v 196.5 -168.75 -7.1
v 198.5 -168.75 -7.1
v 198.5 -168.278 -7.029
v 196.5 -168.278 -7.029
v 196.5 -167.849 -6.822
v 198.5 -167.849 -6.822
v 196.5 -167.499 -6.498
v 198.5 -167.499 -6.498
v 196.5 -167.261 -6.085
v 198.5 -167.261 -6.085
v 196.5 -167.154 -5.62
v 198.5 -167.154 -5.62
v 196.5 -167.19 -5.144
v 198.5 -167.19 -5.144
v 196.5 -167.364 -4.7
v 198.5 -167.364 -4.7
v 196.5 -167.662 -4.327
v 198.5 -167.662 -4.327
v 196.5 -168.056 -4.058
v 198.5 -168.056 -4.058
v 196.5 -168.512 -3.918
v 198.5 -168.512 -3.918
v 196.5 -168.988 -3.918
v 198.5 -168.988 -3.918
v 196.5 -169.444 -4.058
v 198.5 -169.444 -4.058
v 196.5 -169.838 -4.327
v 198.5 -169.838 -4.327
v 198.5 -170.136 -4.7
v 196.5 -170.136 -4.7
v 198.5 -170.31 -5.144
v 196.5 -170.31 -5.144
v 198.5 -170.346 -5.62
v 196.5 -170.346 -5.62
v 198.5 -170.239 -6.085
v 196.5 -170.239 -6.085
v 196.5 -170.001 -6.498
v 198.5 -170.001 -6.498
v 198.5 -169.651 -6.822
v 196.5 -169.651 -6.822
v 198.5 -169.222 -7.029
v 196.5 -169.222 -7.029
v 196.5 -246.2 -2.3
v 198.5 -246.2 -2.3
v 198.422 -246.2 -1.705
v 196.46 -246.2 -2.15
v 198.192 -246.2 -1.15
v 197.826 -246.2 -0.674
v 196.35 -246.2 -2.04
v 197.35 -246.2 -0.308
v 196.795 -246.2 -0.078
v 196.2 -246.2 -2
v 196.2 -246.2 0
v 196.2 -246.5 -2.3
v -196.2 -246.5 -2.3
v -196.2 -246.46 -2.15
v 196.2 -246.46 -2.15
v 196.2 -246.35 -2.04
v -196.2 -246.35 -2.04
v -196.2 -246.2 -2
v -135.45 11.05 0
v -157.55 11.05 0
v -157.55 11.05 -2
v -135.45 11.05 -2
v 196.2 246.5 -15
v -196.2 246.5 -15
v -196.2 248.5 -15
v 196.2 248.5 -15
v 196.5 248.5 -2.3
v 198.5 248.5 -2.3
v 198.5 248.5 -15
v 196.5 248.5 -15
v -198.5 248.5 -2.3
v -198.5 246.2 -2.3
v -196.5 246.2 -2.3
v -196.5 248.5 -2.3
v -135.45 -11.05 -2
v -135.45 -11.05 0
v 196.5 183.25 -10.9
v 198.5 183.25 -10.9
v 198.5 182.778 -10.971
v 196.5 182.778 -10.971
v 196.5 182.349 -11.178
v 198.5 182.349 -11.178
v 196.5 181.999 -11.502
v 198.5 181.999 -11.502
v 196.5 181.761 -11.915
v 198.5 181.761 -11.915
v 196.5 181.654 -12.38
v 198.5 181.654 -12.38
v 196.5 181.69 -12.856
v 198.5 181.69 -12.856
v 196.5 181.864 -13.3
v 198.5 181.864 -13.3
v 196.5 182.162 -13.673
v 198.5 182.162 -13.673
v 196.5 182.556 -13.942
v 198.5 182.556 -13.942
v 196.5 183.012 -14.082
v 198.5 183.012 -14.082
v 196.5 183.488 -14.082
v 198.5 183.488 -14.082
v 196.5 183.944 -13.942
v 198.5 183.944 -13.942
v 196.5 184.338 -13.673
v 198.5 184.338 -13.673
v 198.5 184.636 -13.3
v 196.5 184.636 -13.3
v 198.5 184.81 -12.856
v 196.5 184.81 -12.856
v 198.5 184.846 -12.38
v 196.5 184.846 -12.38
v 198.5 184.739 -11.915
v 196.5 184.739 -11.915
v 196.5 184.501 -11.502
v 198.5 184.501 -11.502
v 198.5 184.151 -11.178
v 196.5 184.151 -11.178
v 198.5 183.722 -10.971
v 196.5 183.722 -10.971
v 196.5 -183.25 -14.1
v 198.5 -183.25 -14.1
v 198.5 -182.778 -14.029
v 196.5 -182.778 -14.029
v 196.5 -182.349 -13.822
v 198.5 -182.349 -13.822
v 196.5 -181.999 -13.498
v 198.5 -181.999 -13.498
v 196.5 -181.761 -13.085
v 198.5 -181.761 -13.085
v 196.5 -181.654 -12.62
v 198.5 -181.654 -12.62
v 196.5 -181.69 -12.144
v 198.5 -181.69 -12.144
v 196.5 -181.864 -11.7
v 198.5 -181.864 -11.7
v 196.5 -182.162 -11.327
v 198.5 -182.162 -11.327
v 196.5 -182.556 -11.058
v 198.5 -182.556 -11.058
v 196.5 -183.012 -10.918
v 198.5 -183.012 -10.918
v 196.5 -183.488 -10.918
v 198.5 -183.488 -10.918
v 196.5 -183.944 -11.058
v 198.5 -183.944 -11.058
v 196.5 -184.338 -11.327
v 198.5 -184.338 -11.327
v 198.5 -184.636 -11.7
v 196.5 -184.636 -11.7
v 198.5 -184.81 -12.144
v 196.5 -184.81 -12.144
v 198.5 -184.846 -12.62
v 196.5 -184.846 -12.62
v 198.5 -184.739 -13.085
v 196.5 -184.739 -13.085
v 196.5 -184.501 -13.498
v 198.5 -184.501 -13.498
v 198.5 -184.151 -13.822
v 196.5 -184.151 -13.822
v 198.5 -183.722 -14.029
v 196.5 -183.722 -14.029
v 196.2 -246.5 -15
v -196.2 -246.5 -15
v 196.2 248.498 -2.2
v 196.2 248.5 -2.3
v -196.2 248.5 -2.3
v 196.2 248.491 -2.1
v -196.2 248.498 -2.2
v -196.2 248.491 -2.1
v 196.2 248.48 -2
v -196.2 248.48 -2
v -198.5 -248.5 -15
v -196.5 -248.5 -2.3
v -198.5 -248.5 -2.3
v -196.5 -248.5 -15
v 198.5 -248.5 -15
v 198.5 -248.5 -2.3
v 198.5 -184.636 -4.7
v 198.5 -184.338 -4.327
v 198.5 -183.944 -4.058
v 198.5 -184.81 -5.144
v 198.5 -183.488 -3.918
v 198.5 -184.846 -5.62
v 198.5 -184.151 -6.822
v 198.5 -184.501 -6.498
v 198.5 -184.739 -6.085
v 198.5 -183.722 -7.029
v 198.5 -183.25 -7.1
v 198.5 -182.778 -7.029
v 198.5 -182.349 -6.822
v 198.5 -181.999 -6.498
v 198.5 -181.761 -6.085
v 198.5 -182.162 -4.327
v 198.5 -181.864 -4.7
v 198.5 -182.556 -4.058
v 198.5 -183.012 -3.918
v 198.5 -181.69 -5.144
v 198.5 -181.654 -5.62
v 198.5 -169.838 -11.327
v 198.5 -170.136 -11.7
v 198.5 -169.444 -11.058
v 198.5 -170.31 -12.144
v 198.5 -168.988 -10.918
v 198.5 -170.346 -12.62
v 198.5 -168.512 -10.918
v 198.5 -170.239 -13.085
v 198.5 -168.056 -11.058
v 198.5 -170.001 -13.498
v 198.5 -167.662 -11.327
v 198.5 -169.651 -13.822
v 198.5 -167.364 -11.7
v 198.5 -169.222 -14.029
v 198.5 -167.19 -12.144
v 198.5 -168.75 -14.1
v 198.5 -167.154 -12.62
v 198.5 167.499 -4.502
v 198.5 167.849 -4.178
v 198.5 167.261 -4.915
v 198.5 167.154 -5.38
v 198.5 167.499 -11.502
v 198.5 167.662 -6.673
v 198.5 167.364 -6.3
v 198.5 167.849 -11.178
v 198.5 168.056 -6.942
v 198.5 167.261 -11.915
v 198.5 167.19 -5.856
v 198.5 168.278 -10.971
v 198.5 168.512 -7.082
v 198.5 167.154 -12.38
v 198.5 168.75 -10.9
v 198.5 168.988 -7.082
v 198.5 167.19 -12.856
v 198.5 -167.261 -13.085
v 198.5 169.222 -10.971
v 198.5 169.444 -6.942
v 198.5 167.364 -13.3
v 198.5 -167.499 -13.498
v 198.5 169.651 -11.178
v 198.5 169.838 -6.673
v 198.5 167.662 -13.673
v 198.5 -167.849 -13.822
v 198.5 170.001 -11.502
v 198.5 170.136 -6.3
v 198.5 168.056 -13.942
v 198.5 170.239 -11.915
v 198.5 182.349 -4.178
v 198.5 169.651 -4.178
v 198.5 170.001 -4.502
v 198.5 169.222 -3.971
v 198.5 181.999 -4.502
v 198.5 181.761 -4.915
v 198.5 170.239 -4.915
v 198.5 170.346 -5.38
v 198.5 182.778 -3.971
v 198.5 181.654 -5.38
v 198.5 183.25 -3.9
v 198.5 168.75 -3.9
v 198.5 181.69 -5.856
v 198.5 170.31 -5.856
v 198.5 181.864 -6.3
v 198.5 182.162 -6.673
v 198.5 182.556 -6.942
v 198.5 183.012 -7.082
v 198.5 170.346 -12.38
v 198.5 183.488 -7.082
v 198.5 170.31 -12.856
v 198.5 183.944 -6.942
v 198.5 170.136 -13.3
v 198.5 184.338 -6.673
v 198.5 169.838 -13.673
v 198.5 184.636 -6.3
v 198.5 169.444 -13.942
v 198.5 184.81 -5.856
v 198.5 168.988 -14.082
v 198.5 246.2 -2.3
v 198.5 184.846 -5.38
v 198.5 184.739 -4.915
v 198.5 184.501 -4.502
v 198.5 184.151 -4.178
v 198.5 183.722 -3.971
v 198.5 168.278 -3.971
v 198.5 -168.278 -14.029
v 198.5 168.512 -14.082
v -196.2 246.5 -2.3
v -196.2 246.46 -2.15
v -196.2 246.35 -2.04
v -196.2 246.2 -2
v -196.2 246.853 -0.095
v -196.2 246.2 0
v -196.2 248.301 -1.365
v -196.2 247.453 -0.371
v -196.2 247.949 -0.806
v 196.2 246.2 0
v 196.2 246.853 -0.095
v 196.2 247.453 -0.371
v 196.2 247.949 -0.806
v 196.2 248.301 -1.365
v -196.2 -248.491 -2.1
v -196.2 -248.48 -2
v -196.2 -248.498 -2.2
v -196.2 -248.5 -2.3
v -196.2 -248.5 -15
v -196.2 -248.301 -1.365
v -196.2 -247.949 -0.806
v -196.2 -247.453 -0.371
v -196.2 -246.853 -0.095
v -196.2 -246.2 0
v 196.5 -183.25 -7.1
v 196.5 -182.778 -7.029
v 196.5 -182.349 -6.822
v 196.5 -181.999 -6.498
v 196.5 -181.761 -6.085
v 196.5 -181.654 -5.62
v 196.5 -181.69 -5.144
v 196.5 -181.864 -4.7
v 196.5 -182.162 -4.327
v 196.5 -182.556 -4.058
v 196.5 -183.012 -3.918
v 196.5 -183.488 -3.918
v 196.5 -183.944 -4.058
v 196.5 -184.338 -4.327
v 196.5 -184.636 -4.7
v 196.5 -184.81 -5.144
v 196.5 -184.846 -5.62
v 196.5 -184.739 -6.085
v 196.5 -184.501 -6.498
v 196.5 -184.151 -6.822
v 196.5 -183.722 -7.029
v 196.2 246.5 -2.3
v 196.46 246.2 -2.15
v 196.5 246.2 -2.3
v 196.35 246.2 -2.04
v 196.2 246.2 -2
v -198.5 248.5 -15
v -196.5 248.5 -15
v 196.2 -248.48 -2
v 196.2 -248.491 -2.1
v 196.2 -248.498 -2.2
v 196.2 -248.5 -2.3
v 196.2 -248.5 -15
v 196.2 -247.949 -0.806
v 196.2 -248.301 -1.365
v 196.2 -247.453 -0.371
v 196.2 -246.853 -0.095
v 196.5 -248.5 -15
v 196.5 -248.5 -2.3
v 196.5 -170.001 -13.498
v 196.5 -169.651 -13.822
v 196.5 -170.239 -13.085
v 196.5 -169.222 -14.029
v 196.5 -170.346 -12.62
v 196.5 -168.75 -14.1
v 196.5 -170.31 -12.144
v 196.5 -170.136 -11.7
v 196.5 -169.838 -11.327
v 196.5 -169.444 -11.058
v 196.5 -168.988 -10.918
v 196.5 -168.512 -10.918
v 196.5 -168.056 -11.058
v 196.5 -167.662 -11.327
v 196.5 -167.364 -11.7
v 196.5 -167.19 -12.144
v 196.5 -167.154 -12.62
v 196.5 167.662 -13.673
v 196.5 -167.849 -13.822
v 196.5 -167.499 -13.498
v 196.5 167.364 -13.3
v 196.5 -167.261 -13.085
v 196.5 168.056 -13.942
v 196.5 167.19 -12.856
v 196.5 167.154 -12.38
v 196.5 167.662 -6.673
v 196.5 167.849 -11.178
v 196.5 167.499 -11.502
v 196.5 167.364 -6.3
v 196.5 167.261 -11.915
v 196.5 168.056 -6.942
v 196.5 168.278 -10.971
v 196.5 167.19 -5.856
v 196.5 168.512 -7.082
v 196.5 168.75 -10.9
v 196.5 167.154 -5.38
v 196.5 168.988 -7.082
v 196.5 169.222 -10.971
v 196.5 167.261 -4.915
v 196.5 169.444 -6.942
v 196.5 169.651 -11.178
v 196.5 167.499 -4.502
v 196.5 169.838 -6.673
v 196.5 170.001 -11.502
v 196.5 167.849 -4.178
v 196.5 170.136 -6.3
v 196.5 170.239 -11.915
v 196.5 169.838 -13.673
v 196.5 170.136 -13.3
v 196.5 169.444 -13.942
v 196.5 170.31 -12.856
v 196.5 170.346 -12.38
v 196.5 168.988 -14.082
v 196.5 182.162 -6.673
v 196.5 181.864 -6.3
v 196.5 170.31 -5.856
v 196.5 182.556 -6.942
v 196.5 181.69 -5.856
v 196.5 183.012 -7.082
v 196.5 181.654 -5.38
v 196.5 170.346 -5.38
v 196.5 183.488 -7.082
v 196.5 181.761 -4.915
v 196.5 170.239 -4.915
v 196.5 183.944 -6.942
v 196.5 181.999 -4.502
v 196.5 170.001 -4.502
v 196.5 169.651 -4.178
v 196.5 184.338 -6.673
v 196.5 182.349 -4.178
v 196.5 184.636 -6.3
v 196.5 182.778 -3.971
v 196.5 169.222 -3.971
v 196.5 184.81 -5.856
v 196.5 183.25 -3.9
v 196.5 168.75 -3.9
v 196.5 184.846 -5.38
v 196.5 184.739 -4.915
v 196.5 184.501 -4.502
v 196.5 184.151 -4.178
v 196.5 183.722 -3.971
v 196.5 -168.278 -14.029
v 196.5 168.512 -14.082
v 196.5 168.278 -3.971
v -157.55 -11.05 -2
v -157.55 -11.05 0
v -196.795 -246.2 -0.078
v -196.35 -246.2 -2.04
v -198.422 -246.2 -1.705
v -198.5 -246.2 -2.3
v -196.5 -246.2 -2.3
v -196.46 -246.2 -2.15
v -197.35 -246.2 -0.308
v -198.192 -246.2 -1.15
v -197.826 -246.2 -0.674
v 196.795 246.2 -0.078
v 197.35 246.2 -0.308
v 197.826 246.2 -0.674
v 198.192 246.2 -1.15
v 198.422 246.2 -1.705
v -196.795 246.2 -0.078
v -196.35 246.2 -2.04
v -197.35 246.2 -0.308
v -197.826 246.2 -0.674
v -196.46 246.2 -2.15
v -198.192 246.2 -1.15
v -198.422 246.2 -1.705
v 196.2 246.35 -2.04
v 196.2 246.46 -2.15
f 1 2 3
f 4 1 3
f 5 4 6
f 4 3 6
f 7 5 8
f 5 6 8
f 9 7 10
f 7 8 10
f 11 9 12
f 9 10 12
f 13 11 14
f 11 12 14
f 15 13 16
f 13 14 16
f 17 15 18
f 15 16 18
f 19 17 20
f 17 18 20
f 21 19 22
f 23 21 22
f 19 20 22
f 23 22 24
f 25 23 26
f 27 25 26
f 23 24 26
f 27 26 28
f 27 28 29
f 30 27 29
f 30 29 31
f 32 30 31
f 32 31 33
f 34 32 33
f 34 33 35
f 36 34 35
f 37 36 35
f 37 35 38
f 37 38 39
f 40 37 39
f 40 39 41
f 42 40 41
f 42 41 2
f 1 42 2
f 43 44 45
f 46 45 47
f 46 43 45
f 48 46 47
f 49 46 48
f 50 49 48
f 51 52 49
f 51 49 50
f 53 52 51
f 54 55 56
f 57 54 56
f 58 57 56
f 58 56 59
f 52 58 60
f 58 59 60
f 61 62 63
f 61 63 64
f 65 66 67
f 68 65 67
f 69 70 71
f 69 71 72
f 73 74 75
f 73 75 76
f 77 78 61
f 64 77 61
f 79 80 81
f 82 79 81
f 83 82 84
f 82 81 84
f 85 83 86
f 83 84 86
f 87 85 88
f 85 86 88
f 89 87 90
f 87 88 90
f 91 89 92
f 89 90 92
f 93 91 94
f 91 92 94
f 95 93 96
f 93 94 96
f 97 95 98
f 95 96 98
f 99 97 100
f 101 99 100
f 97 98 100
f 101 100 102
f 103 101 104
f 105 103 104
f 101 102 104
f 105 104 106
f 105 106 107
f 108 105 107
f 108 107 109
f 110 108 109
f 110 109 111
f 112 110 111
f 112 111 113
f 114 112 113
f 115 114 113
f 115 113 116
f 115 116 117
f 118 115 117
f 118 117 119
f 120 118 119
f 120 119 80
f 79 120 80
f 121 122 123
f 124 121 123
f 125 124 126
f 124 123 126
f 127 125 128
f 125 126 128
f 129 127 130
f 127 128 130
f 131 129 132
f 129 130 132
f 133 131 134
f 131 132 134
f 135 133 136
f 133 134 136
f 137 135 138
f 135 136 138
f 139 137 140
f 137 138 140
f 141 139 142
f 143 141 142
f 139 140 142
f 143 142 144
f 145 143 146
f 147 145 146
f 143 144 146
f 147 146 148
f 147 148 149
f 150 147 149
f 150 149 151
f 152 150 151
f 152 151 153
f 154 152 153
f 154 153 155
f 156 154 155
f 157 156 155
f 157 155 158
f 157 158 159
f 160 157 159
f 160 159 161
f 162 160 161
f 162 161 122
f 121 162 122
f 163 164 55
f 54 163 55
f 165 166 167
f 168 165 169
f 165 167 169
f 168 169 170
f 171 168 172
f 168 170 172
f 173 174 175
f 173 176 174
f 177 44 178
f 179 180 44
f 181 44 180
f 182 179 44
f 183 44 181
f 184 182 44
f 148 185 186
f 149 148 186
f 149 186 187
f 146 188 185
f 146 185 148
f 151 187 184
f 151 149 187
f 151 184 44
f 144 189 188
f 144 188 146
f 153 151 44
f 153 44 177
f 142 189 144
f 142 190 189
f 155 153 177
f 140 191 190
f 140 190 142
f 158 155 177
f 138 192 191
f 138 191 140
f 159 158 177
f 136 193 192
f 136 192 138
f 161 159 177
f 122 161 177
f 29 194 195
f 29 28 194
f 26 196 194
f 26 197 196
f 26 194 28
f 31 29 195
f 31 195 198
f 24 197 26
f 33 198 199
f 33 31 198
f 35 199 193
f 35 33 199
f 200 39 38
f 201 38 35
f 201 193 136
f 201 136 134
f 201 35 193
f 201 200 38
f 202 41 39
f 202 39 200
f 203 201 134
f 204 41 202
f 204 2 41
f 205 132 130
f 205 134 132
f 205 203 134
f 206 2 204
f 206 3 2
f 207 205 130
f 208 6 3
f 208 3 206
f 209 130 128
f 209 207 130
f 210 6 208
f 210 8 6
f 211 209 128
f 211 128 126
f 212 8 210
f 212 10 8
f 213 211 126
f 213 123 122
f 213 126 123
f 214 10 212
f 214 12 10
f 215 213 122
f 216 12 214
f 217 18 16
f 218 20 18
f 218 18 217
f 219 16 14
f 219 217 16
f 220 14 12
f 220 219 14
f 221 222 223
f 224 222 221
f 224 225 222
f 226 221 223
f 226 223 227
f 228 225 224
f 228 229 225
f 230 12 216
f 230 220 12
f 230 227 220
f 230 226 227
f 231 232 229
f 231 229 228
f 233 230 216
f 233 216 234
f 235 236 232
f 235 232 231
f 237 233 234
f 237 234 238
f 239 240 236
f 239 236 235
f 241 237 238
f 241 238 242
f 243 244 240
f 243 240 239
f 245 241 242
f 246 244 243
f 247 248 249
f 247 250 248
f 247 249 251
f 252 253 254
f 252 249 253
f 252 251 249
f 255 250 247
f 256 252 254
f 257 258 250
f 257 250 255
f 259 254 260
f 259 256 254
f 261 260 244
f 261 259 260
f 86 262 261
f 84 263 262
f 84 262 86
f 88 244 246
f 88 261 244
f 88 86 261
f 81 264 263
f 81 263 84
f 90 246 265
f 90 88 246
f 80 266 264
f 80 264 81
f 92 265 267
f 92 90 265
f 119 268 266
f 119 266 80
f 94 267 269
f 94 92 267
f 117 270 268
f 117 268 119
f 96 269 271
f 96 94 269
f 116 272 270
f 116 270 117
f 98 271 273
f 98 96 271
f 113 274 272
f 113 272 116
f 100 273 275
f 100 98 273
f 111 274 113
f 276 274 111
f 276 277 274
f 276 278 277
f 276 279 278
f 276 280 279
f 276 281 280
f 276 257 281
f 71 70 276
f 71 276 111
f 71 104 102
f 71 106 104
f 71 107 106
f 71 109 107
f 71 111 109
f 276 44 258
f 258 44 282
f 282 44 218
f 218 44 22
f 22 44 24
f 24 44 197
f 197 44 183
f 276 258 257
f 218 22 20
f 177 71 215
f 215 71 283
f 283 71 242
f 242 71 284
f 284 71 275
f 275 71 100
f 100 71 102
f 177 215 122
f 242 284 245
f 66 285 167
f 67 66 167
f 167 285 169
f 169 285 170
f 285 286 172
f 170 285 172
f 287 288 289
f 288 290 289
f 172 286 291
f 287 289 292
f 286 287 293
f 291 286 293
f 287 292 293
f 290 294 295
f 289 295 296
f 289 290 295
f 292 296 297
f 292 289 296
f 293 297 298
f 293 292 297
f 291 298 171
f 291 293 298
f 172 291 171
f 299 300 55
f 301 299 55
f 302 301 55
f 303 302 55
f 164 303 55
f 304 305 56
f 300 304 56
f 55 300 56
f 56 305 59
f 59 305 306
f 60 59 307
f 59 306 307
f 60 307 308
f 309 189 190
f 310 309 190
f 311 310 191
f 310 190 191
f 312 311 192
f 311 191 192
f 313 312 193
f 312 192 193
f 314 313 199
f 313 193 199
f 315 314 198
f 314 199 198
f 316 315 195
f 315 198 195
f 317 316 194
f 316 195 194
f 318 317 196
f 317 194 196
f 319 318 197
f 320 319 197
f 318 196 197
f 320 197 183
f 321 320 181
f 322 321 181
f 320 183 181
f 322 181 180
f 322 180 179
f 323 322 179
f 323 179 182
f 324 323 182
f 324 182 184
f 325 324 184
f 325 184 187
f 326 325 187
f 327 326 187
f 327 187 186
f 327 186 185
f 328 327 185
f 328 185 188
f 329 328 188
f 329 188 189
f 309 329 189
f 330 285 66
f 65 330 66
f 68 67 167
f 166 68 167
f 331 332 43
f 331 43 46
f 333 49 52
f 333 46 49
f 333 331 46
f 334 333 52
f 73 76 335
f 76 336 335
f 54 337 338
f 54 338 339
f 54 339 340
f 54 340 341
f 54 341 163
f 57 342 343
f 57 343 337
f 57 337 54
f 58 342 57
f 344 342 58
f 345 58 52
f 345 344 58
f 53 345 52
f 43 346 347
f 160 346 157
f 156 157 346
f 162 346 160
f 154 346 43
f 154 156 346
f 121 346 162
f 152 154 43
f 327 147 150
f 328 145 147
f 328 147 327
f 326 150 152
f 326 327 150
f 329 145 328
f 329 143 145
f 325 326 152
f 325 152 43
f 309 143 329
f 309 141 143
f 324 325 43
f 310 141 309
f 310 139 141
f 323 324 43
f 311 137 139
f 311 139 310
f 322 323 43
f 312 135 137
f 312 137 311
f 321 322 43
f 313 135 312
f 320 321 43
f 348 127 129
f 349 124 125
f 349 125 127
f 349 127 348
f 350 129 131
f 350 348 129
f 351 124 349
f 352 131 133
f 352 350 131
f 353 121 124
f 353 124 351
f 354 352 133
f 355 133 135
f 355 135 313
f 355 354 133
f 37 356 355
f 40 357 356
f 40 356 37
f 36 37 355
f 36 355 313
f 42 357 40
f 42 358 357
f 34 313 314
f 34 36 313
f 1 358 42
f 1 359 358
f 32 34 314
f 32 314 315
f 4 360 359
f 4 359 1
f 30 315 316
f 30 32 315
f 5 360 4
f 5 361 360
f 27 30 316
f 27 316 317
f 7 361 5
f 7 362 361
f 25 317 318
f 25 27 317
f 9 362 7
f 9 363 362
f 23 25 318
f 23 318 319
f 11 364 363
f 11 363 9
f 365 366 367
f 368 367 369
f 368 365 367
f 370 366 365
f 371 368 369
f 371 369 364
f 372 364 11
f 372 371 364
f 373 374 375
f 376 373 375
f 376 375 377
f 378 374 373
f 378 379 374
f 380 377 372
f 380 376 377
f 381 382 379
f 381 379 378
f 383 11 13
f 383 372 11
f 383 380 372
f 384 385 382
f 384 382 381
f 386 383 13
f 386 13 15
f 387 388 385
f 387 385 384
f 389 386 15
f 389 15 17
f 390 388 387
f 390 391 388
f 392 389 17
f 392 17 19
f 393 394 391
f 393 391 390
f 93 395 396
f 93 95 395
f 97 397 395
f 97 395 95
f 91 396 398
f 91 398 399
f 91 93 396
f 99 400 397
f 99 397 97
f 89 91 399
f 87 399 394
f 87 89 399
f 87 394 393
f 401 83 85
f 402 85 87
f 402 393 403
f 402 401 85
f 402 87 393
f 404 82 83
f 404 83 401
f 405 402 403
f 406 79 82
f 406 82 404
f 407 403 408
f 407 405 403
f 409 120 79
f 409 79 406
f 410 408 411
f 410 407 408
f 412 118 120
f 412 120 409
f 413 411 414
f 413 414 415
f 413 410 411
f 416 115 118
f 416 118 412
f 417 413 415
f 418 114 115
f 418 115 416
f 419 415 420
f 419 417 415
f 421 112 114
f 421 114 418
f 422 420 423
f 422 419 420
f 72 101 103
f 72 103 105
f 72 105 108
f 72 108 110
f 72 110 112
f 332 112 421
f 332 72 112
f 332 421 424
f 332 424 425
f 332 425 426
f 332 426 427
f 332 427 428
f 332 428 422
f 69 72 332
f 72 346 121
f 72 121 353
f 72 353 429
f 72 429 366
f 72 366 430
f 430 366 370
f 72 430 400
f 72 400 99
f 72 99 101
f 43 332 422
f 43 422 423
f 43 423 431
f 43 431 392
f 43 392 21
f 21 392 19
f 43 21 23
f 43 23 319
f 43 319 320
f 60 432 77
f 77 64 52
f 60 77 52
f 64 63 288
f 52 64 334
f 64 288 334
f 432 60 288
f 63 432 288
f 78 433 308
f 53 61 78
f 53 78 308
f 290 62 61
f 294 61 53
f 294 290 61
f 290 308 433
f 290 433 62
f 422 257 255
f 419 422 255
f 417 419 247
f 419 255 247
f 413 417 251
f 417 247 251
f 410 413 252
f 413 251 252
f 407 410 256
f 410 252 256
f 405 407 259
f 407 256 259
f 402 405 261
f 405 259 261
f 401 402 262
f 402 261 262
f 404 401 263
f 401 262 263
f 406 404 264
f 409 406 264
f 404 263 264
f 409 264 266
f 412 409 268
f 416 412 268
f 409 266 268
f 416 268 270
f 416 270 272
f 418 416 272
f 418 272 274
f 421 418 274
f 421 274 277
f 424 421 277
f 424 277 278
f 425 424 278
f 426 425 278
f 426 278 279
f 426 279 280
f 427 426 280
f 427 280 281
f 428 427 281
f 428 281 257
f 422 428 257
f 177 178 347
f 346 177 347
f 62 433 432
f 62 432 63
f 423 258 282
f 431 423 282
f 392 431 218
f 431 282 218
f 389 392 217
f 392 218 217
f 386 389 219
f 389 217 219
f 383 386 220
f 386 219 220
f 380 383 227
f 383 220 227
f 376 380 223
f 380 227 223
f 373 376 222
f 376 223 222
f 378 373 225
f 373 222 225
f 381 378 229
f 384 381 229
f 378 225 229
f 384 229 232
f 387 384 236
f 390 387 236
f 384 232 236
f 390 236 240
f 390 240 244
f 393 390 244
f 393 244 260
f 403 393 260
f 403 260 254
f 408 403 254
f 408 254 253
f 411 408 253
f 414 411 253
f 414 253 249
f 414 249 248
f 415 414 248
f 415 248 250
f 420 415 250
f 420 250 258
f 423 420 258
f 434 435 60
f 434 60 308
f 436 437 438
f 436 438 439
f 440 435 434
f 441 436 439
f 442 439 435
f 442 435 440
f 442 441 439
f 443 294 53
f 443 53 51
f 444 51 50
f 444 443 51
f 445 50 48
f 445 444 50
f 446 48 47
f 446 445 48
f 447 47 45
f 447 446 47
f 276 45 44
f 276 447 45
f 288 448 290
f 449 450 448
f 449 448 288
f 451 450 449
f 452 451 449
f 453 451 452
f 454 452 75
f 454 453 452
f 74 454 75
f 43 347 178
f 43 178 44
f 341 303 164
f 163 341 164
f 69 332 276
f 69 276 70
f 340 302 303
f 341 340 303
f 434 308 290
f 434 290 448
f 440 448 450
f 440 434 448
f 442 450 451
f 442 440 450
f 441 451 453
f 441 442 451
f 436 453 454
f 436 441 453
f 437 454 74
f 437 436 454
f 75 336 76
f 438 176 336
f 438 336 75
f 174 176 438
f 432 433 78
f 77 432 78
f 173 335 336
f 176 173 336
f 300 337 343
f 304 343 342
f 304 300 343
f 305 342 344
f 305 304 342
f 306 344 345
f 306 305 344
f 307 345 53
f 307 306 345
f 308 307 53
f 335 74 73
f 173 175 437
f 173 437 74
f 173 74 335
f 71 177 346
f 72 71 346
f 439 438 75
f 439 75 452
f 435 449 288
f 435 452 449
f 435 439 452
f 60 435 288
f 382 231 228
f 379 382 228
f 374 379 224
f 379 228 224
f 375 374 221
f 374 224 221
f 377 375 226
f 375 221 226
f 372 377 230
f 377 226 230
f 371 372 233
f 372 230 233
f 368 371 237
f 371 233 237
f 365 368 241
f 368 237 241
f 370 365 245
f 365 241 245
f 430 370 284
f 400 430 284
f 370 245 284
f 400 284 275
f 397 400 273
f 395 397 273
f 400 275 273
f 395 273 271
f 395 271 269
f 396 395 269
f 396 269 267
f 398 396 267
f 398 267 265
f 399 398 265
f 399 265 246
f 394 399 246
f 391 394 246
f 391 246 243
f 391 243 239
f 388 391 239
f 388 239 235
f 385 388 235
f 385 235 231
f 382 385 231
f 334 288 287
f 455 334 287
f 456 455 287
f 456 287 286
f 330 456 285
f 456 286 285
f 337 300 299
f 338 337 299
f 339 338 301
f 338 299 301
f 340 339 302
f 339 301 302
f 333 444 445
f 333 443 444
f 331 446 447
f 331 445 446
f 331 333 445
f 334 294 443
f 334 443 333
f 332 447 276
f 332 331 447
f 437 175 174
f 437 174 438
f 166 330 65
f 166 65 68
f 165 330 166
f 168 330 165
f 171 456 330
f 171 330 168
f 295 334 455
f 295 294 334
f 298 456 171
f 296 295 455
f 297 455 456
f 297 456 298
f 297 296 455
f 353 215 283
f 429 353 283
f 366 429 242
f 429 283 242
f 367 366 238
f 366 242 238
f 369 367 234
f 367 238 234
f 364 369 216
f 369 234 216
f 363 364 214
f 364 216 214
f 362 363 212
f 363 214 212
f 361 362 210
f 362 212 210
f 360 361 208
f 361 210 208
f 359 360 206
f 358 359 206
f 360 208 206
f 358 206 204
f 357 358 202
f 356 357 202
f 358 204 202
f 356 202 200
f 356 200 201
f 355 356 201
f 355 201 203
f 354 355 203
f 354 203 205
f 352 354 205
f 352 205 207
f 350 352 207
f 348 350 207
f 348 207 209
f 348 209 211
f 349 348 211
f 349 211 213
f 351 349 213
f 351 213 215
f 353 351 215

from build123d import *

# Parameters (mm, degrees)
SKETCH_1_W                         = 397
SKETCH_1_H                         = 497
SKETCH_1_W_2                       = 22.1
SKETCH_1_H_2                       = 22.1
SM_BASE_FLANGE_1_DEPTH             = 2
SM_EDGE_FLANGE_1_STRIP_W           = 8.6
SM_EDGE_FLANGE_1_STRIP_H           = 2
SM_EDGE_FLANGE_1_STRIP_CUT_DEPTH   = 497
SM_EDGE_FLANGE_1_STRIP_2_W         = 8.6
SM_EDGE_FLANGE_1_STRIP_2_H         = 2
SM_EDGE_FLANGE_1_STRIP_CUT_2_DEPTH = 497
SM_EDGE_FLANGE_1_DEPTH             = 497
SM_EDGE_FLANGE_1_BEND_DEPTH        = 497
SM_START                           = -198.5
SM_EDGE_FLANGE_2_DEPTH             = 397
SM_EDGE_FLANGE_2_2_DEPTH           = 2.3
SM_START_2                         = 196.2
SM_EDGE_FLANGE_2_3_DEPTH           = 2.3
SM_START_3                         = -196.2
SM_EDGE_FLANGE_2_4_DEPTH           = 392.4
SKETCH_18_R                        = 1.6
CUT_EXTRUDE_1_DEPTH                = 10


# Read off the part's stored shape, not the designer's step: 边线-法兰2
# Sheet-metal steps are written as plain solids
with BuildPart() as part:
    # Sketch 1 → 基体-法兰1 (new body)
    with BuildSketch(Plane.XY):
        Rectangle(SKETCH_1_W, SKETCH_1_H)
        with Locations((-146.5, 0)):
            Rectangle(SKETCH_1_W_2, SKETCH_1_H_2, mode=Mode.SUBTRACT)
    extrude(amount=-SM_BASE_FLANGE_1_DEPTH)

    # 边线-法兰1 strip (across the edge) → 边线-法兰1 strip cut (cut)
    with BuildSketch(Plane(origin=(198.5, 248.5, -2), x_dir=(-1, 0, 0), z_dir=(0, -1, 0))):
        with Locations((-2, -1)):
            Rectangle(SM_EDGE_FLANGE_1_STRIP_W, SM_EDGE_FLANGE_1_STRIP_H)
    extrude(amount=SM_EDGE_FLANGE_1_STRIP_CUT_DEPTH, mode=Mode.SUBTRACT)

    # 边线-法兰1 strip 2 (across the edge) → 边线-法兰1 strip cut 2 (cut)
    with BuildSketch(Plane(origin=(-198.5, -248.5, -2), x_dir=(1, 0, 0), z_dir=(0, 1, 0))):
        with Locations((-2, -1)):
            Rectangle(SM_EDGE_FLANGE_1_STRIP_2_W, SM_EDGE_FLANGE_1_STRIP_2_H)
    extrude(amount=SM_EDGE_FLANGE_1_STRIP_CUT_2_DEPTH, mode=Mode.SUBTRACT)

    # 边线-法兰1 section (across the edge) → 边线-法兰1 (add)
    with BuildSketch(Plane(origin=(198.5, 248.5, -2), x_dir=(-1, 0, 0), z_dir=(0, -1, 0))):
        with BuildLine():
            Line((0, 0.3), (0, 13))
            Line((0, 13), (2, 13))
            Line((2, 13), (2, 0.3))
            ThreePointArc((2, 0.3), (2.087867966, 0.087867966), (2.3, 0))
            Line((2.3, 0), (2.3, -2))
            ThreePointArc((2.3, -2), (0.673654403, -1.326345597), (0, 0.3))
        make_face()
    extrude(amount=SM_EDGE_FLANGE_1_DEPTH)

    # 边线-法兰1 section 2 (across the edge) → 边线-法兰1 bend (add)
    with BuildSketch(Plane(origin=(-198.5, -248.5, -2), x_dir=(1, 0, 0), z_dir=(0, 1, 0))):
        with BuildLine():
            Line((0, 0.3), (0, 13))
            Line((0, 13), (2, 13))
            Line((2, 13), (2, 0.3))
            ThreePointArc((2, 0.3), (2.087867966, 0.087867966), (2.3, 0))
            Line((2.3, 0), (2.3, -2))
            ThreePointArc((2.3, -2), (0.673654403, -1.326345597), (0, 0.3))
        make_face()
    extrude(amount=SM_EDGE_FLANGE_1_BEND_DEPTH)

    # 边线-法兰2 outline → 边线-法兰2 (cut)
    with BuildSketch(Plane.YZ.offset(SM_START)):
        with BuildLine():
            Line((-246.5, -2.3), (-246.2, -2.3))
            Line((-246.2, -2.3), (-246.2, -2))
            ThreePointArc((-246.2, -2), (-246.412132034, -2.087867966), (-246.5, -2.3))
        make_face()
        with BuildLine():
            ThreePointArc((-248.5, -2.3), (-247.826345597, -0.673654403), (-246.2, 0))
            Line((-246.2, 0), (-248.5, 0))
            Line((-248.5, 0), (-248.5, -2.3))
        make_face()
        with BuildLine():
            ThreePointArc((246.5, -2.3), (246.412132034, -2.087867966), (246.2, -2))
            Line((246.2, -2), (246.2, -2.3))
            Line((246.2, -2.3), (246.5, -2.3))
        make_face()
        with BuildLine():
            Line((248.5, 0), (246.2, 0))
            ThreePointArc((246.2, 0), (247.826345597, -0.673654403), (248.5, -2.3))
            Line((248.5, -2.3), (248.5, 0))
        make_face()
    extrude(amount=SM_EDGE_FLANGE_2_DEPTH, mode=Mode.SUBTRACT)

    # Sm Edge Flange 2 2 outline → Sm Edge Flange 2 2 (cut)
    with BuildSketch(Plane.YZ.offset(SM_START)):
        with BuildLine():
            Line((-248.5, -2.3), (-246.5, -2.3))
            ThreePointArc((-246.5, -2.3), (-246.412132034, -2.087867966), (-246.2, -2))
            Line((-246.2, -2), (-246.2, 0))
            ThreePointArc((-246.2, 0), (-247.826345597, -0.673654403), (-248.5, -2.3))
        make_face()
        with BuildLine():
            ThreePointArc((248.5, -2.3), (247.826345597, -0.673654403), (246.2, 0))
            Line((246.2, 0), (246.2, -2))
            ThreePointArc((246.2, -2), (246.412132034, -2.087867966), (246.5, -2.3))
            Line((246.5, -2.3), (248.5, -2.3))
        make_face()
    extrude(amount=SM_EDGE_FLANGE_2_2_DEPTH, mode=Mode.SUBTRACT)

    # Sm Edge Flange 2 3 outline → Sm Edge Flange 2 3 (cut)
    with BuildSketch(Plane.YZ.offset(SM_START_2)):
        with BuildLine():
            Line((-248.5, -2.3), (-246.5, -2.3))
            ThreePointArc((-246.5, -2.3), (-246.412132034, -2.087867966), (-246.2, -2))
            Line((-246.2, -2), (-246.2, 0))
            ThreePointArc((-246.2, 0), (-247.826345597, -0.673654403), (-248.5, -2.3))
        make_face()
        with BuildLine():
            ThreePointArc((248.5, -2.3), (247.826345597, -0.673654403), (246.2, 0))
            Line((246.2, 0), (246.2, -2))
            ThreePointArc((246.2, -2), (246.412132034, -2.087867966), (246.5, -2.3))
            Line((246.5, -2.3), (248.5, -2.3))
        make_face()
    extrude(amount=SM_EDGE_FLANGE_2_3_DEPTH, mode=Mode.SUBTRACT)

    # Sm Edge Flange 2 4 outline → Sm Edge Flange 2 4 (add)
    with BuildSketch(Plane.YZ.offset(SM_START_3)):
        with BuildLine():
            Line((-246.5, -15), (-246.5, -2.3))
            ThreePointArc((-246.5, -2.3), (-246.412132034, -2.087867966), (-246.2, -2))
            Line((-246.2, -2), (-248.48035085, -2))
            ThreePointArc((-248.48035085, -2), (-248.495082456, -2.149678603), (-248.5, -2.3))
            Line((-248.5, -2.3), (-248.5, -15))
            Line((-248.5, -15), (-246.5, -15))
        make_face()
        with BuildLine():
            Line((248.48035085, -2), (246.2, -2))
            ThreePointArc((246.2, -2), (246.412132034, -2.087867966), (246.5, -2.3))
            Line((246.5, -2.3), (246.5, -15))
            Line((246.5, -15), (248.5, -15))
            Line((248.5, -15), (248.5, -2.3))
            ThreePointArc((248.5, -2.3), (248.495082456, -2.149678603), (248.48035085, -2))
        make_face()
    extrude(amount=SM_EDGE_FLANGE_2_4_DEPTH)

    # 草图18 → 切除-拉伸1 (cut)
    with BuildSketch(Plane(origin=(198.5, 0, 0), x_dir=(0, 0, -1), z_dir=(1, 0, 0))):
        with Locations((5.5, -183.25)):
            Circle(SKETCH_18_R)
        with Locations((12.5, -183.25)):
            Circle(SKETCH_18_R)
        with Locations((5.5, -168.75)):
            Circle(SKETCH_18_R)
        with Locations((12.5, -168.75)):
            Circle(SKETCH_18_R)
        with Locations(Location((12.5, 168.75, 0), (0, 0, 180))):
            Circle(SKETCH_18_R)
        with Locations(Location((5.5, 168.75, 0), (0, 0, 180))):
            Circle(SKETCH_18_R)
        with Locations(Location((12.5, 183.25, 0), (0, 0, 180))):
            Circle(SKETCH_18_R)
        with Locations(Location((5.5, 183.25, 0), (0, 0, 180))):
            Circle(SKETCH_18_R)
    extrude(amount=-CUT_EXTRUDE_1_DEPTH, mode=Mode.SUBTRACT)


solid = part.part
